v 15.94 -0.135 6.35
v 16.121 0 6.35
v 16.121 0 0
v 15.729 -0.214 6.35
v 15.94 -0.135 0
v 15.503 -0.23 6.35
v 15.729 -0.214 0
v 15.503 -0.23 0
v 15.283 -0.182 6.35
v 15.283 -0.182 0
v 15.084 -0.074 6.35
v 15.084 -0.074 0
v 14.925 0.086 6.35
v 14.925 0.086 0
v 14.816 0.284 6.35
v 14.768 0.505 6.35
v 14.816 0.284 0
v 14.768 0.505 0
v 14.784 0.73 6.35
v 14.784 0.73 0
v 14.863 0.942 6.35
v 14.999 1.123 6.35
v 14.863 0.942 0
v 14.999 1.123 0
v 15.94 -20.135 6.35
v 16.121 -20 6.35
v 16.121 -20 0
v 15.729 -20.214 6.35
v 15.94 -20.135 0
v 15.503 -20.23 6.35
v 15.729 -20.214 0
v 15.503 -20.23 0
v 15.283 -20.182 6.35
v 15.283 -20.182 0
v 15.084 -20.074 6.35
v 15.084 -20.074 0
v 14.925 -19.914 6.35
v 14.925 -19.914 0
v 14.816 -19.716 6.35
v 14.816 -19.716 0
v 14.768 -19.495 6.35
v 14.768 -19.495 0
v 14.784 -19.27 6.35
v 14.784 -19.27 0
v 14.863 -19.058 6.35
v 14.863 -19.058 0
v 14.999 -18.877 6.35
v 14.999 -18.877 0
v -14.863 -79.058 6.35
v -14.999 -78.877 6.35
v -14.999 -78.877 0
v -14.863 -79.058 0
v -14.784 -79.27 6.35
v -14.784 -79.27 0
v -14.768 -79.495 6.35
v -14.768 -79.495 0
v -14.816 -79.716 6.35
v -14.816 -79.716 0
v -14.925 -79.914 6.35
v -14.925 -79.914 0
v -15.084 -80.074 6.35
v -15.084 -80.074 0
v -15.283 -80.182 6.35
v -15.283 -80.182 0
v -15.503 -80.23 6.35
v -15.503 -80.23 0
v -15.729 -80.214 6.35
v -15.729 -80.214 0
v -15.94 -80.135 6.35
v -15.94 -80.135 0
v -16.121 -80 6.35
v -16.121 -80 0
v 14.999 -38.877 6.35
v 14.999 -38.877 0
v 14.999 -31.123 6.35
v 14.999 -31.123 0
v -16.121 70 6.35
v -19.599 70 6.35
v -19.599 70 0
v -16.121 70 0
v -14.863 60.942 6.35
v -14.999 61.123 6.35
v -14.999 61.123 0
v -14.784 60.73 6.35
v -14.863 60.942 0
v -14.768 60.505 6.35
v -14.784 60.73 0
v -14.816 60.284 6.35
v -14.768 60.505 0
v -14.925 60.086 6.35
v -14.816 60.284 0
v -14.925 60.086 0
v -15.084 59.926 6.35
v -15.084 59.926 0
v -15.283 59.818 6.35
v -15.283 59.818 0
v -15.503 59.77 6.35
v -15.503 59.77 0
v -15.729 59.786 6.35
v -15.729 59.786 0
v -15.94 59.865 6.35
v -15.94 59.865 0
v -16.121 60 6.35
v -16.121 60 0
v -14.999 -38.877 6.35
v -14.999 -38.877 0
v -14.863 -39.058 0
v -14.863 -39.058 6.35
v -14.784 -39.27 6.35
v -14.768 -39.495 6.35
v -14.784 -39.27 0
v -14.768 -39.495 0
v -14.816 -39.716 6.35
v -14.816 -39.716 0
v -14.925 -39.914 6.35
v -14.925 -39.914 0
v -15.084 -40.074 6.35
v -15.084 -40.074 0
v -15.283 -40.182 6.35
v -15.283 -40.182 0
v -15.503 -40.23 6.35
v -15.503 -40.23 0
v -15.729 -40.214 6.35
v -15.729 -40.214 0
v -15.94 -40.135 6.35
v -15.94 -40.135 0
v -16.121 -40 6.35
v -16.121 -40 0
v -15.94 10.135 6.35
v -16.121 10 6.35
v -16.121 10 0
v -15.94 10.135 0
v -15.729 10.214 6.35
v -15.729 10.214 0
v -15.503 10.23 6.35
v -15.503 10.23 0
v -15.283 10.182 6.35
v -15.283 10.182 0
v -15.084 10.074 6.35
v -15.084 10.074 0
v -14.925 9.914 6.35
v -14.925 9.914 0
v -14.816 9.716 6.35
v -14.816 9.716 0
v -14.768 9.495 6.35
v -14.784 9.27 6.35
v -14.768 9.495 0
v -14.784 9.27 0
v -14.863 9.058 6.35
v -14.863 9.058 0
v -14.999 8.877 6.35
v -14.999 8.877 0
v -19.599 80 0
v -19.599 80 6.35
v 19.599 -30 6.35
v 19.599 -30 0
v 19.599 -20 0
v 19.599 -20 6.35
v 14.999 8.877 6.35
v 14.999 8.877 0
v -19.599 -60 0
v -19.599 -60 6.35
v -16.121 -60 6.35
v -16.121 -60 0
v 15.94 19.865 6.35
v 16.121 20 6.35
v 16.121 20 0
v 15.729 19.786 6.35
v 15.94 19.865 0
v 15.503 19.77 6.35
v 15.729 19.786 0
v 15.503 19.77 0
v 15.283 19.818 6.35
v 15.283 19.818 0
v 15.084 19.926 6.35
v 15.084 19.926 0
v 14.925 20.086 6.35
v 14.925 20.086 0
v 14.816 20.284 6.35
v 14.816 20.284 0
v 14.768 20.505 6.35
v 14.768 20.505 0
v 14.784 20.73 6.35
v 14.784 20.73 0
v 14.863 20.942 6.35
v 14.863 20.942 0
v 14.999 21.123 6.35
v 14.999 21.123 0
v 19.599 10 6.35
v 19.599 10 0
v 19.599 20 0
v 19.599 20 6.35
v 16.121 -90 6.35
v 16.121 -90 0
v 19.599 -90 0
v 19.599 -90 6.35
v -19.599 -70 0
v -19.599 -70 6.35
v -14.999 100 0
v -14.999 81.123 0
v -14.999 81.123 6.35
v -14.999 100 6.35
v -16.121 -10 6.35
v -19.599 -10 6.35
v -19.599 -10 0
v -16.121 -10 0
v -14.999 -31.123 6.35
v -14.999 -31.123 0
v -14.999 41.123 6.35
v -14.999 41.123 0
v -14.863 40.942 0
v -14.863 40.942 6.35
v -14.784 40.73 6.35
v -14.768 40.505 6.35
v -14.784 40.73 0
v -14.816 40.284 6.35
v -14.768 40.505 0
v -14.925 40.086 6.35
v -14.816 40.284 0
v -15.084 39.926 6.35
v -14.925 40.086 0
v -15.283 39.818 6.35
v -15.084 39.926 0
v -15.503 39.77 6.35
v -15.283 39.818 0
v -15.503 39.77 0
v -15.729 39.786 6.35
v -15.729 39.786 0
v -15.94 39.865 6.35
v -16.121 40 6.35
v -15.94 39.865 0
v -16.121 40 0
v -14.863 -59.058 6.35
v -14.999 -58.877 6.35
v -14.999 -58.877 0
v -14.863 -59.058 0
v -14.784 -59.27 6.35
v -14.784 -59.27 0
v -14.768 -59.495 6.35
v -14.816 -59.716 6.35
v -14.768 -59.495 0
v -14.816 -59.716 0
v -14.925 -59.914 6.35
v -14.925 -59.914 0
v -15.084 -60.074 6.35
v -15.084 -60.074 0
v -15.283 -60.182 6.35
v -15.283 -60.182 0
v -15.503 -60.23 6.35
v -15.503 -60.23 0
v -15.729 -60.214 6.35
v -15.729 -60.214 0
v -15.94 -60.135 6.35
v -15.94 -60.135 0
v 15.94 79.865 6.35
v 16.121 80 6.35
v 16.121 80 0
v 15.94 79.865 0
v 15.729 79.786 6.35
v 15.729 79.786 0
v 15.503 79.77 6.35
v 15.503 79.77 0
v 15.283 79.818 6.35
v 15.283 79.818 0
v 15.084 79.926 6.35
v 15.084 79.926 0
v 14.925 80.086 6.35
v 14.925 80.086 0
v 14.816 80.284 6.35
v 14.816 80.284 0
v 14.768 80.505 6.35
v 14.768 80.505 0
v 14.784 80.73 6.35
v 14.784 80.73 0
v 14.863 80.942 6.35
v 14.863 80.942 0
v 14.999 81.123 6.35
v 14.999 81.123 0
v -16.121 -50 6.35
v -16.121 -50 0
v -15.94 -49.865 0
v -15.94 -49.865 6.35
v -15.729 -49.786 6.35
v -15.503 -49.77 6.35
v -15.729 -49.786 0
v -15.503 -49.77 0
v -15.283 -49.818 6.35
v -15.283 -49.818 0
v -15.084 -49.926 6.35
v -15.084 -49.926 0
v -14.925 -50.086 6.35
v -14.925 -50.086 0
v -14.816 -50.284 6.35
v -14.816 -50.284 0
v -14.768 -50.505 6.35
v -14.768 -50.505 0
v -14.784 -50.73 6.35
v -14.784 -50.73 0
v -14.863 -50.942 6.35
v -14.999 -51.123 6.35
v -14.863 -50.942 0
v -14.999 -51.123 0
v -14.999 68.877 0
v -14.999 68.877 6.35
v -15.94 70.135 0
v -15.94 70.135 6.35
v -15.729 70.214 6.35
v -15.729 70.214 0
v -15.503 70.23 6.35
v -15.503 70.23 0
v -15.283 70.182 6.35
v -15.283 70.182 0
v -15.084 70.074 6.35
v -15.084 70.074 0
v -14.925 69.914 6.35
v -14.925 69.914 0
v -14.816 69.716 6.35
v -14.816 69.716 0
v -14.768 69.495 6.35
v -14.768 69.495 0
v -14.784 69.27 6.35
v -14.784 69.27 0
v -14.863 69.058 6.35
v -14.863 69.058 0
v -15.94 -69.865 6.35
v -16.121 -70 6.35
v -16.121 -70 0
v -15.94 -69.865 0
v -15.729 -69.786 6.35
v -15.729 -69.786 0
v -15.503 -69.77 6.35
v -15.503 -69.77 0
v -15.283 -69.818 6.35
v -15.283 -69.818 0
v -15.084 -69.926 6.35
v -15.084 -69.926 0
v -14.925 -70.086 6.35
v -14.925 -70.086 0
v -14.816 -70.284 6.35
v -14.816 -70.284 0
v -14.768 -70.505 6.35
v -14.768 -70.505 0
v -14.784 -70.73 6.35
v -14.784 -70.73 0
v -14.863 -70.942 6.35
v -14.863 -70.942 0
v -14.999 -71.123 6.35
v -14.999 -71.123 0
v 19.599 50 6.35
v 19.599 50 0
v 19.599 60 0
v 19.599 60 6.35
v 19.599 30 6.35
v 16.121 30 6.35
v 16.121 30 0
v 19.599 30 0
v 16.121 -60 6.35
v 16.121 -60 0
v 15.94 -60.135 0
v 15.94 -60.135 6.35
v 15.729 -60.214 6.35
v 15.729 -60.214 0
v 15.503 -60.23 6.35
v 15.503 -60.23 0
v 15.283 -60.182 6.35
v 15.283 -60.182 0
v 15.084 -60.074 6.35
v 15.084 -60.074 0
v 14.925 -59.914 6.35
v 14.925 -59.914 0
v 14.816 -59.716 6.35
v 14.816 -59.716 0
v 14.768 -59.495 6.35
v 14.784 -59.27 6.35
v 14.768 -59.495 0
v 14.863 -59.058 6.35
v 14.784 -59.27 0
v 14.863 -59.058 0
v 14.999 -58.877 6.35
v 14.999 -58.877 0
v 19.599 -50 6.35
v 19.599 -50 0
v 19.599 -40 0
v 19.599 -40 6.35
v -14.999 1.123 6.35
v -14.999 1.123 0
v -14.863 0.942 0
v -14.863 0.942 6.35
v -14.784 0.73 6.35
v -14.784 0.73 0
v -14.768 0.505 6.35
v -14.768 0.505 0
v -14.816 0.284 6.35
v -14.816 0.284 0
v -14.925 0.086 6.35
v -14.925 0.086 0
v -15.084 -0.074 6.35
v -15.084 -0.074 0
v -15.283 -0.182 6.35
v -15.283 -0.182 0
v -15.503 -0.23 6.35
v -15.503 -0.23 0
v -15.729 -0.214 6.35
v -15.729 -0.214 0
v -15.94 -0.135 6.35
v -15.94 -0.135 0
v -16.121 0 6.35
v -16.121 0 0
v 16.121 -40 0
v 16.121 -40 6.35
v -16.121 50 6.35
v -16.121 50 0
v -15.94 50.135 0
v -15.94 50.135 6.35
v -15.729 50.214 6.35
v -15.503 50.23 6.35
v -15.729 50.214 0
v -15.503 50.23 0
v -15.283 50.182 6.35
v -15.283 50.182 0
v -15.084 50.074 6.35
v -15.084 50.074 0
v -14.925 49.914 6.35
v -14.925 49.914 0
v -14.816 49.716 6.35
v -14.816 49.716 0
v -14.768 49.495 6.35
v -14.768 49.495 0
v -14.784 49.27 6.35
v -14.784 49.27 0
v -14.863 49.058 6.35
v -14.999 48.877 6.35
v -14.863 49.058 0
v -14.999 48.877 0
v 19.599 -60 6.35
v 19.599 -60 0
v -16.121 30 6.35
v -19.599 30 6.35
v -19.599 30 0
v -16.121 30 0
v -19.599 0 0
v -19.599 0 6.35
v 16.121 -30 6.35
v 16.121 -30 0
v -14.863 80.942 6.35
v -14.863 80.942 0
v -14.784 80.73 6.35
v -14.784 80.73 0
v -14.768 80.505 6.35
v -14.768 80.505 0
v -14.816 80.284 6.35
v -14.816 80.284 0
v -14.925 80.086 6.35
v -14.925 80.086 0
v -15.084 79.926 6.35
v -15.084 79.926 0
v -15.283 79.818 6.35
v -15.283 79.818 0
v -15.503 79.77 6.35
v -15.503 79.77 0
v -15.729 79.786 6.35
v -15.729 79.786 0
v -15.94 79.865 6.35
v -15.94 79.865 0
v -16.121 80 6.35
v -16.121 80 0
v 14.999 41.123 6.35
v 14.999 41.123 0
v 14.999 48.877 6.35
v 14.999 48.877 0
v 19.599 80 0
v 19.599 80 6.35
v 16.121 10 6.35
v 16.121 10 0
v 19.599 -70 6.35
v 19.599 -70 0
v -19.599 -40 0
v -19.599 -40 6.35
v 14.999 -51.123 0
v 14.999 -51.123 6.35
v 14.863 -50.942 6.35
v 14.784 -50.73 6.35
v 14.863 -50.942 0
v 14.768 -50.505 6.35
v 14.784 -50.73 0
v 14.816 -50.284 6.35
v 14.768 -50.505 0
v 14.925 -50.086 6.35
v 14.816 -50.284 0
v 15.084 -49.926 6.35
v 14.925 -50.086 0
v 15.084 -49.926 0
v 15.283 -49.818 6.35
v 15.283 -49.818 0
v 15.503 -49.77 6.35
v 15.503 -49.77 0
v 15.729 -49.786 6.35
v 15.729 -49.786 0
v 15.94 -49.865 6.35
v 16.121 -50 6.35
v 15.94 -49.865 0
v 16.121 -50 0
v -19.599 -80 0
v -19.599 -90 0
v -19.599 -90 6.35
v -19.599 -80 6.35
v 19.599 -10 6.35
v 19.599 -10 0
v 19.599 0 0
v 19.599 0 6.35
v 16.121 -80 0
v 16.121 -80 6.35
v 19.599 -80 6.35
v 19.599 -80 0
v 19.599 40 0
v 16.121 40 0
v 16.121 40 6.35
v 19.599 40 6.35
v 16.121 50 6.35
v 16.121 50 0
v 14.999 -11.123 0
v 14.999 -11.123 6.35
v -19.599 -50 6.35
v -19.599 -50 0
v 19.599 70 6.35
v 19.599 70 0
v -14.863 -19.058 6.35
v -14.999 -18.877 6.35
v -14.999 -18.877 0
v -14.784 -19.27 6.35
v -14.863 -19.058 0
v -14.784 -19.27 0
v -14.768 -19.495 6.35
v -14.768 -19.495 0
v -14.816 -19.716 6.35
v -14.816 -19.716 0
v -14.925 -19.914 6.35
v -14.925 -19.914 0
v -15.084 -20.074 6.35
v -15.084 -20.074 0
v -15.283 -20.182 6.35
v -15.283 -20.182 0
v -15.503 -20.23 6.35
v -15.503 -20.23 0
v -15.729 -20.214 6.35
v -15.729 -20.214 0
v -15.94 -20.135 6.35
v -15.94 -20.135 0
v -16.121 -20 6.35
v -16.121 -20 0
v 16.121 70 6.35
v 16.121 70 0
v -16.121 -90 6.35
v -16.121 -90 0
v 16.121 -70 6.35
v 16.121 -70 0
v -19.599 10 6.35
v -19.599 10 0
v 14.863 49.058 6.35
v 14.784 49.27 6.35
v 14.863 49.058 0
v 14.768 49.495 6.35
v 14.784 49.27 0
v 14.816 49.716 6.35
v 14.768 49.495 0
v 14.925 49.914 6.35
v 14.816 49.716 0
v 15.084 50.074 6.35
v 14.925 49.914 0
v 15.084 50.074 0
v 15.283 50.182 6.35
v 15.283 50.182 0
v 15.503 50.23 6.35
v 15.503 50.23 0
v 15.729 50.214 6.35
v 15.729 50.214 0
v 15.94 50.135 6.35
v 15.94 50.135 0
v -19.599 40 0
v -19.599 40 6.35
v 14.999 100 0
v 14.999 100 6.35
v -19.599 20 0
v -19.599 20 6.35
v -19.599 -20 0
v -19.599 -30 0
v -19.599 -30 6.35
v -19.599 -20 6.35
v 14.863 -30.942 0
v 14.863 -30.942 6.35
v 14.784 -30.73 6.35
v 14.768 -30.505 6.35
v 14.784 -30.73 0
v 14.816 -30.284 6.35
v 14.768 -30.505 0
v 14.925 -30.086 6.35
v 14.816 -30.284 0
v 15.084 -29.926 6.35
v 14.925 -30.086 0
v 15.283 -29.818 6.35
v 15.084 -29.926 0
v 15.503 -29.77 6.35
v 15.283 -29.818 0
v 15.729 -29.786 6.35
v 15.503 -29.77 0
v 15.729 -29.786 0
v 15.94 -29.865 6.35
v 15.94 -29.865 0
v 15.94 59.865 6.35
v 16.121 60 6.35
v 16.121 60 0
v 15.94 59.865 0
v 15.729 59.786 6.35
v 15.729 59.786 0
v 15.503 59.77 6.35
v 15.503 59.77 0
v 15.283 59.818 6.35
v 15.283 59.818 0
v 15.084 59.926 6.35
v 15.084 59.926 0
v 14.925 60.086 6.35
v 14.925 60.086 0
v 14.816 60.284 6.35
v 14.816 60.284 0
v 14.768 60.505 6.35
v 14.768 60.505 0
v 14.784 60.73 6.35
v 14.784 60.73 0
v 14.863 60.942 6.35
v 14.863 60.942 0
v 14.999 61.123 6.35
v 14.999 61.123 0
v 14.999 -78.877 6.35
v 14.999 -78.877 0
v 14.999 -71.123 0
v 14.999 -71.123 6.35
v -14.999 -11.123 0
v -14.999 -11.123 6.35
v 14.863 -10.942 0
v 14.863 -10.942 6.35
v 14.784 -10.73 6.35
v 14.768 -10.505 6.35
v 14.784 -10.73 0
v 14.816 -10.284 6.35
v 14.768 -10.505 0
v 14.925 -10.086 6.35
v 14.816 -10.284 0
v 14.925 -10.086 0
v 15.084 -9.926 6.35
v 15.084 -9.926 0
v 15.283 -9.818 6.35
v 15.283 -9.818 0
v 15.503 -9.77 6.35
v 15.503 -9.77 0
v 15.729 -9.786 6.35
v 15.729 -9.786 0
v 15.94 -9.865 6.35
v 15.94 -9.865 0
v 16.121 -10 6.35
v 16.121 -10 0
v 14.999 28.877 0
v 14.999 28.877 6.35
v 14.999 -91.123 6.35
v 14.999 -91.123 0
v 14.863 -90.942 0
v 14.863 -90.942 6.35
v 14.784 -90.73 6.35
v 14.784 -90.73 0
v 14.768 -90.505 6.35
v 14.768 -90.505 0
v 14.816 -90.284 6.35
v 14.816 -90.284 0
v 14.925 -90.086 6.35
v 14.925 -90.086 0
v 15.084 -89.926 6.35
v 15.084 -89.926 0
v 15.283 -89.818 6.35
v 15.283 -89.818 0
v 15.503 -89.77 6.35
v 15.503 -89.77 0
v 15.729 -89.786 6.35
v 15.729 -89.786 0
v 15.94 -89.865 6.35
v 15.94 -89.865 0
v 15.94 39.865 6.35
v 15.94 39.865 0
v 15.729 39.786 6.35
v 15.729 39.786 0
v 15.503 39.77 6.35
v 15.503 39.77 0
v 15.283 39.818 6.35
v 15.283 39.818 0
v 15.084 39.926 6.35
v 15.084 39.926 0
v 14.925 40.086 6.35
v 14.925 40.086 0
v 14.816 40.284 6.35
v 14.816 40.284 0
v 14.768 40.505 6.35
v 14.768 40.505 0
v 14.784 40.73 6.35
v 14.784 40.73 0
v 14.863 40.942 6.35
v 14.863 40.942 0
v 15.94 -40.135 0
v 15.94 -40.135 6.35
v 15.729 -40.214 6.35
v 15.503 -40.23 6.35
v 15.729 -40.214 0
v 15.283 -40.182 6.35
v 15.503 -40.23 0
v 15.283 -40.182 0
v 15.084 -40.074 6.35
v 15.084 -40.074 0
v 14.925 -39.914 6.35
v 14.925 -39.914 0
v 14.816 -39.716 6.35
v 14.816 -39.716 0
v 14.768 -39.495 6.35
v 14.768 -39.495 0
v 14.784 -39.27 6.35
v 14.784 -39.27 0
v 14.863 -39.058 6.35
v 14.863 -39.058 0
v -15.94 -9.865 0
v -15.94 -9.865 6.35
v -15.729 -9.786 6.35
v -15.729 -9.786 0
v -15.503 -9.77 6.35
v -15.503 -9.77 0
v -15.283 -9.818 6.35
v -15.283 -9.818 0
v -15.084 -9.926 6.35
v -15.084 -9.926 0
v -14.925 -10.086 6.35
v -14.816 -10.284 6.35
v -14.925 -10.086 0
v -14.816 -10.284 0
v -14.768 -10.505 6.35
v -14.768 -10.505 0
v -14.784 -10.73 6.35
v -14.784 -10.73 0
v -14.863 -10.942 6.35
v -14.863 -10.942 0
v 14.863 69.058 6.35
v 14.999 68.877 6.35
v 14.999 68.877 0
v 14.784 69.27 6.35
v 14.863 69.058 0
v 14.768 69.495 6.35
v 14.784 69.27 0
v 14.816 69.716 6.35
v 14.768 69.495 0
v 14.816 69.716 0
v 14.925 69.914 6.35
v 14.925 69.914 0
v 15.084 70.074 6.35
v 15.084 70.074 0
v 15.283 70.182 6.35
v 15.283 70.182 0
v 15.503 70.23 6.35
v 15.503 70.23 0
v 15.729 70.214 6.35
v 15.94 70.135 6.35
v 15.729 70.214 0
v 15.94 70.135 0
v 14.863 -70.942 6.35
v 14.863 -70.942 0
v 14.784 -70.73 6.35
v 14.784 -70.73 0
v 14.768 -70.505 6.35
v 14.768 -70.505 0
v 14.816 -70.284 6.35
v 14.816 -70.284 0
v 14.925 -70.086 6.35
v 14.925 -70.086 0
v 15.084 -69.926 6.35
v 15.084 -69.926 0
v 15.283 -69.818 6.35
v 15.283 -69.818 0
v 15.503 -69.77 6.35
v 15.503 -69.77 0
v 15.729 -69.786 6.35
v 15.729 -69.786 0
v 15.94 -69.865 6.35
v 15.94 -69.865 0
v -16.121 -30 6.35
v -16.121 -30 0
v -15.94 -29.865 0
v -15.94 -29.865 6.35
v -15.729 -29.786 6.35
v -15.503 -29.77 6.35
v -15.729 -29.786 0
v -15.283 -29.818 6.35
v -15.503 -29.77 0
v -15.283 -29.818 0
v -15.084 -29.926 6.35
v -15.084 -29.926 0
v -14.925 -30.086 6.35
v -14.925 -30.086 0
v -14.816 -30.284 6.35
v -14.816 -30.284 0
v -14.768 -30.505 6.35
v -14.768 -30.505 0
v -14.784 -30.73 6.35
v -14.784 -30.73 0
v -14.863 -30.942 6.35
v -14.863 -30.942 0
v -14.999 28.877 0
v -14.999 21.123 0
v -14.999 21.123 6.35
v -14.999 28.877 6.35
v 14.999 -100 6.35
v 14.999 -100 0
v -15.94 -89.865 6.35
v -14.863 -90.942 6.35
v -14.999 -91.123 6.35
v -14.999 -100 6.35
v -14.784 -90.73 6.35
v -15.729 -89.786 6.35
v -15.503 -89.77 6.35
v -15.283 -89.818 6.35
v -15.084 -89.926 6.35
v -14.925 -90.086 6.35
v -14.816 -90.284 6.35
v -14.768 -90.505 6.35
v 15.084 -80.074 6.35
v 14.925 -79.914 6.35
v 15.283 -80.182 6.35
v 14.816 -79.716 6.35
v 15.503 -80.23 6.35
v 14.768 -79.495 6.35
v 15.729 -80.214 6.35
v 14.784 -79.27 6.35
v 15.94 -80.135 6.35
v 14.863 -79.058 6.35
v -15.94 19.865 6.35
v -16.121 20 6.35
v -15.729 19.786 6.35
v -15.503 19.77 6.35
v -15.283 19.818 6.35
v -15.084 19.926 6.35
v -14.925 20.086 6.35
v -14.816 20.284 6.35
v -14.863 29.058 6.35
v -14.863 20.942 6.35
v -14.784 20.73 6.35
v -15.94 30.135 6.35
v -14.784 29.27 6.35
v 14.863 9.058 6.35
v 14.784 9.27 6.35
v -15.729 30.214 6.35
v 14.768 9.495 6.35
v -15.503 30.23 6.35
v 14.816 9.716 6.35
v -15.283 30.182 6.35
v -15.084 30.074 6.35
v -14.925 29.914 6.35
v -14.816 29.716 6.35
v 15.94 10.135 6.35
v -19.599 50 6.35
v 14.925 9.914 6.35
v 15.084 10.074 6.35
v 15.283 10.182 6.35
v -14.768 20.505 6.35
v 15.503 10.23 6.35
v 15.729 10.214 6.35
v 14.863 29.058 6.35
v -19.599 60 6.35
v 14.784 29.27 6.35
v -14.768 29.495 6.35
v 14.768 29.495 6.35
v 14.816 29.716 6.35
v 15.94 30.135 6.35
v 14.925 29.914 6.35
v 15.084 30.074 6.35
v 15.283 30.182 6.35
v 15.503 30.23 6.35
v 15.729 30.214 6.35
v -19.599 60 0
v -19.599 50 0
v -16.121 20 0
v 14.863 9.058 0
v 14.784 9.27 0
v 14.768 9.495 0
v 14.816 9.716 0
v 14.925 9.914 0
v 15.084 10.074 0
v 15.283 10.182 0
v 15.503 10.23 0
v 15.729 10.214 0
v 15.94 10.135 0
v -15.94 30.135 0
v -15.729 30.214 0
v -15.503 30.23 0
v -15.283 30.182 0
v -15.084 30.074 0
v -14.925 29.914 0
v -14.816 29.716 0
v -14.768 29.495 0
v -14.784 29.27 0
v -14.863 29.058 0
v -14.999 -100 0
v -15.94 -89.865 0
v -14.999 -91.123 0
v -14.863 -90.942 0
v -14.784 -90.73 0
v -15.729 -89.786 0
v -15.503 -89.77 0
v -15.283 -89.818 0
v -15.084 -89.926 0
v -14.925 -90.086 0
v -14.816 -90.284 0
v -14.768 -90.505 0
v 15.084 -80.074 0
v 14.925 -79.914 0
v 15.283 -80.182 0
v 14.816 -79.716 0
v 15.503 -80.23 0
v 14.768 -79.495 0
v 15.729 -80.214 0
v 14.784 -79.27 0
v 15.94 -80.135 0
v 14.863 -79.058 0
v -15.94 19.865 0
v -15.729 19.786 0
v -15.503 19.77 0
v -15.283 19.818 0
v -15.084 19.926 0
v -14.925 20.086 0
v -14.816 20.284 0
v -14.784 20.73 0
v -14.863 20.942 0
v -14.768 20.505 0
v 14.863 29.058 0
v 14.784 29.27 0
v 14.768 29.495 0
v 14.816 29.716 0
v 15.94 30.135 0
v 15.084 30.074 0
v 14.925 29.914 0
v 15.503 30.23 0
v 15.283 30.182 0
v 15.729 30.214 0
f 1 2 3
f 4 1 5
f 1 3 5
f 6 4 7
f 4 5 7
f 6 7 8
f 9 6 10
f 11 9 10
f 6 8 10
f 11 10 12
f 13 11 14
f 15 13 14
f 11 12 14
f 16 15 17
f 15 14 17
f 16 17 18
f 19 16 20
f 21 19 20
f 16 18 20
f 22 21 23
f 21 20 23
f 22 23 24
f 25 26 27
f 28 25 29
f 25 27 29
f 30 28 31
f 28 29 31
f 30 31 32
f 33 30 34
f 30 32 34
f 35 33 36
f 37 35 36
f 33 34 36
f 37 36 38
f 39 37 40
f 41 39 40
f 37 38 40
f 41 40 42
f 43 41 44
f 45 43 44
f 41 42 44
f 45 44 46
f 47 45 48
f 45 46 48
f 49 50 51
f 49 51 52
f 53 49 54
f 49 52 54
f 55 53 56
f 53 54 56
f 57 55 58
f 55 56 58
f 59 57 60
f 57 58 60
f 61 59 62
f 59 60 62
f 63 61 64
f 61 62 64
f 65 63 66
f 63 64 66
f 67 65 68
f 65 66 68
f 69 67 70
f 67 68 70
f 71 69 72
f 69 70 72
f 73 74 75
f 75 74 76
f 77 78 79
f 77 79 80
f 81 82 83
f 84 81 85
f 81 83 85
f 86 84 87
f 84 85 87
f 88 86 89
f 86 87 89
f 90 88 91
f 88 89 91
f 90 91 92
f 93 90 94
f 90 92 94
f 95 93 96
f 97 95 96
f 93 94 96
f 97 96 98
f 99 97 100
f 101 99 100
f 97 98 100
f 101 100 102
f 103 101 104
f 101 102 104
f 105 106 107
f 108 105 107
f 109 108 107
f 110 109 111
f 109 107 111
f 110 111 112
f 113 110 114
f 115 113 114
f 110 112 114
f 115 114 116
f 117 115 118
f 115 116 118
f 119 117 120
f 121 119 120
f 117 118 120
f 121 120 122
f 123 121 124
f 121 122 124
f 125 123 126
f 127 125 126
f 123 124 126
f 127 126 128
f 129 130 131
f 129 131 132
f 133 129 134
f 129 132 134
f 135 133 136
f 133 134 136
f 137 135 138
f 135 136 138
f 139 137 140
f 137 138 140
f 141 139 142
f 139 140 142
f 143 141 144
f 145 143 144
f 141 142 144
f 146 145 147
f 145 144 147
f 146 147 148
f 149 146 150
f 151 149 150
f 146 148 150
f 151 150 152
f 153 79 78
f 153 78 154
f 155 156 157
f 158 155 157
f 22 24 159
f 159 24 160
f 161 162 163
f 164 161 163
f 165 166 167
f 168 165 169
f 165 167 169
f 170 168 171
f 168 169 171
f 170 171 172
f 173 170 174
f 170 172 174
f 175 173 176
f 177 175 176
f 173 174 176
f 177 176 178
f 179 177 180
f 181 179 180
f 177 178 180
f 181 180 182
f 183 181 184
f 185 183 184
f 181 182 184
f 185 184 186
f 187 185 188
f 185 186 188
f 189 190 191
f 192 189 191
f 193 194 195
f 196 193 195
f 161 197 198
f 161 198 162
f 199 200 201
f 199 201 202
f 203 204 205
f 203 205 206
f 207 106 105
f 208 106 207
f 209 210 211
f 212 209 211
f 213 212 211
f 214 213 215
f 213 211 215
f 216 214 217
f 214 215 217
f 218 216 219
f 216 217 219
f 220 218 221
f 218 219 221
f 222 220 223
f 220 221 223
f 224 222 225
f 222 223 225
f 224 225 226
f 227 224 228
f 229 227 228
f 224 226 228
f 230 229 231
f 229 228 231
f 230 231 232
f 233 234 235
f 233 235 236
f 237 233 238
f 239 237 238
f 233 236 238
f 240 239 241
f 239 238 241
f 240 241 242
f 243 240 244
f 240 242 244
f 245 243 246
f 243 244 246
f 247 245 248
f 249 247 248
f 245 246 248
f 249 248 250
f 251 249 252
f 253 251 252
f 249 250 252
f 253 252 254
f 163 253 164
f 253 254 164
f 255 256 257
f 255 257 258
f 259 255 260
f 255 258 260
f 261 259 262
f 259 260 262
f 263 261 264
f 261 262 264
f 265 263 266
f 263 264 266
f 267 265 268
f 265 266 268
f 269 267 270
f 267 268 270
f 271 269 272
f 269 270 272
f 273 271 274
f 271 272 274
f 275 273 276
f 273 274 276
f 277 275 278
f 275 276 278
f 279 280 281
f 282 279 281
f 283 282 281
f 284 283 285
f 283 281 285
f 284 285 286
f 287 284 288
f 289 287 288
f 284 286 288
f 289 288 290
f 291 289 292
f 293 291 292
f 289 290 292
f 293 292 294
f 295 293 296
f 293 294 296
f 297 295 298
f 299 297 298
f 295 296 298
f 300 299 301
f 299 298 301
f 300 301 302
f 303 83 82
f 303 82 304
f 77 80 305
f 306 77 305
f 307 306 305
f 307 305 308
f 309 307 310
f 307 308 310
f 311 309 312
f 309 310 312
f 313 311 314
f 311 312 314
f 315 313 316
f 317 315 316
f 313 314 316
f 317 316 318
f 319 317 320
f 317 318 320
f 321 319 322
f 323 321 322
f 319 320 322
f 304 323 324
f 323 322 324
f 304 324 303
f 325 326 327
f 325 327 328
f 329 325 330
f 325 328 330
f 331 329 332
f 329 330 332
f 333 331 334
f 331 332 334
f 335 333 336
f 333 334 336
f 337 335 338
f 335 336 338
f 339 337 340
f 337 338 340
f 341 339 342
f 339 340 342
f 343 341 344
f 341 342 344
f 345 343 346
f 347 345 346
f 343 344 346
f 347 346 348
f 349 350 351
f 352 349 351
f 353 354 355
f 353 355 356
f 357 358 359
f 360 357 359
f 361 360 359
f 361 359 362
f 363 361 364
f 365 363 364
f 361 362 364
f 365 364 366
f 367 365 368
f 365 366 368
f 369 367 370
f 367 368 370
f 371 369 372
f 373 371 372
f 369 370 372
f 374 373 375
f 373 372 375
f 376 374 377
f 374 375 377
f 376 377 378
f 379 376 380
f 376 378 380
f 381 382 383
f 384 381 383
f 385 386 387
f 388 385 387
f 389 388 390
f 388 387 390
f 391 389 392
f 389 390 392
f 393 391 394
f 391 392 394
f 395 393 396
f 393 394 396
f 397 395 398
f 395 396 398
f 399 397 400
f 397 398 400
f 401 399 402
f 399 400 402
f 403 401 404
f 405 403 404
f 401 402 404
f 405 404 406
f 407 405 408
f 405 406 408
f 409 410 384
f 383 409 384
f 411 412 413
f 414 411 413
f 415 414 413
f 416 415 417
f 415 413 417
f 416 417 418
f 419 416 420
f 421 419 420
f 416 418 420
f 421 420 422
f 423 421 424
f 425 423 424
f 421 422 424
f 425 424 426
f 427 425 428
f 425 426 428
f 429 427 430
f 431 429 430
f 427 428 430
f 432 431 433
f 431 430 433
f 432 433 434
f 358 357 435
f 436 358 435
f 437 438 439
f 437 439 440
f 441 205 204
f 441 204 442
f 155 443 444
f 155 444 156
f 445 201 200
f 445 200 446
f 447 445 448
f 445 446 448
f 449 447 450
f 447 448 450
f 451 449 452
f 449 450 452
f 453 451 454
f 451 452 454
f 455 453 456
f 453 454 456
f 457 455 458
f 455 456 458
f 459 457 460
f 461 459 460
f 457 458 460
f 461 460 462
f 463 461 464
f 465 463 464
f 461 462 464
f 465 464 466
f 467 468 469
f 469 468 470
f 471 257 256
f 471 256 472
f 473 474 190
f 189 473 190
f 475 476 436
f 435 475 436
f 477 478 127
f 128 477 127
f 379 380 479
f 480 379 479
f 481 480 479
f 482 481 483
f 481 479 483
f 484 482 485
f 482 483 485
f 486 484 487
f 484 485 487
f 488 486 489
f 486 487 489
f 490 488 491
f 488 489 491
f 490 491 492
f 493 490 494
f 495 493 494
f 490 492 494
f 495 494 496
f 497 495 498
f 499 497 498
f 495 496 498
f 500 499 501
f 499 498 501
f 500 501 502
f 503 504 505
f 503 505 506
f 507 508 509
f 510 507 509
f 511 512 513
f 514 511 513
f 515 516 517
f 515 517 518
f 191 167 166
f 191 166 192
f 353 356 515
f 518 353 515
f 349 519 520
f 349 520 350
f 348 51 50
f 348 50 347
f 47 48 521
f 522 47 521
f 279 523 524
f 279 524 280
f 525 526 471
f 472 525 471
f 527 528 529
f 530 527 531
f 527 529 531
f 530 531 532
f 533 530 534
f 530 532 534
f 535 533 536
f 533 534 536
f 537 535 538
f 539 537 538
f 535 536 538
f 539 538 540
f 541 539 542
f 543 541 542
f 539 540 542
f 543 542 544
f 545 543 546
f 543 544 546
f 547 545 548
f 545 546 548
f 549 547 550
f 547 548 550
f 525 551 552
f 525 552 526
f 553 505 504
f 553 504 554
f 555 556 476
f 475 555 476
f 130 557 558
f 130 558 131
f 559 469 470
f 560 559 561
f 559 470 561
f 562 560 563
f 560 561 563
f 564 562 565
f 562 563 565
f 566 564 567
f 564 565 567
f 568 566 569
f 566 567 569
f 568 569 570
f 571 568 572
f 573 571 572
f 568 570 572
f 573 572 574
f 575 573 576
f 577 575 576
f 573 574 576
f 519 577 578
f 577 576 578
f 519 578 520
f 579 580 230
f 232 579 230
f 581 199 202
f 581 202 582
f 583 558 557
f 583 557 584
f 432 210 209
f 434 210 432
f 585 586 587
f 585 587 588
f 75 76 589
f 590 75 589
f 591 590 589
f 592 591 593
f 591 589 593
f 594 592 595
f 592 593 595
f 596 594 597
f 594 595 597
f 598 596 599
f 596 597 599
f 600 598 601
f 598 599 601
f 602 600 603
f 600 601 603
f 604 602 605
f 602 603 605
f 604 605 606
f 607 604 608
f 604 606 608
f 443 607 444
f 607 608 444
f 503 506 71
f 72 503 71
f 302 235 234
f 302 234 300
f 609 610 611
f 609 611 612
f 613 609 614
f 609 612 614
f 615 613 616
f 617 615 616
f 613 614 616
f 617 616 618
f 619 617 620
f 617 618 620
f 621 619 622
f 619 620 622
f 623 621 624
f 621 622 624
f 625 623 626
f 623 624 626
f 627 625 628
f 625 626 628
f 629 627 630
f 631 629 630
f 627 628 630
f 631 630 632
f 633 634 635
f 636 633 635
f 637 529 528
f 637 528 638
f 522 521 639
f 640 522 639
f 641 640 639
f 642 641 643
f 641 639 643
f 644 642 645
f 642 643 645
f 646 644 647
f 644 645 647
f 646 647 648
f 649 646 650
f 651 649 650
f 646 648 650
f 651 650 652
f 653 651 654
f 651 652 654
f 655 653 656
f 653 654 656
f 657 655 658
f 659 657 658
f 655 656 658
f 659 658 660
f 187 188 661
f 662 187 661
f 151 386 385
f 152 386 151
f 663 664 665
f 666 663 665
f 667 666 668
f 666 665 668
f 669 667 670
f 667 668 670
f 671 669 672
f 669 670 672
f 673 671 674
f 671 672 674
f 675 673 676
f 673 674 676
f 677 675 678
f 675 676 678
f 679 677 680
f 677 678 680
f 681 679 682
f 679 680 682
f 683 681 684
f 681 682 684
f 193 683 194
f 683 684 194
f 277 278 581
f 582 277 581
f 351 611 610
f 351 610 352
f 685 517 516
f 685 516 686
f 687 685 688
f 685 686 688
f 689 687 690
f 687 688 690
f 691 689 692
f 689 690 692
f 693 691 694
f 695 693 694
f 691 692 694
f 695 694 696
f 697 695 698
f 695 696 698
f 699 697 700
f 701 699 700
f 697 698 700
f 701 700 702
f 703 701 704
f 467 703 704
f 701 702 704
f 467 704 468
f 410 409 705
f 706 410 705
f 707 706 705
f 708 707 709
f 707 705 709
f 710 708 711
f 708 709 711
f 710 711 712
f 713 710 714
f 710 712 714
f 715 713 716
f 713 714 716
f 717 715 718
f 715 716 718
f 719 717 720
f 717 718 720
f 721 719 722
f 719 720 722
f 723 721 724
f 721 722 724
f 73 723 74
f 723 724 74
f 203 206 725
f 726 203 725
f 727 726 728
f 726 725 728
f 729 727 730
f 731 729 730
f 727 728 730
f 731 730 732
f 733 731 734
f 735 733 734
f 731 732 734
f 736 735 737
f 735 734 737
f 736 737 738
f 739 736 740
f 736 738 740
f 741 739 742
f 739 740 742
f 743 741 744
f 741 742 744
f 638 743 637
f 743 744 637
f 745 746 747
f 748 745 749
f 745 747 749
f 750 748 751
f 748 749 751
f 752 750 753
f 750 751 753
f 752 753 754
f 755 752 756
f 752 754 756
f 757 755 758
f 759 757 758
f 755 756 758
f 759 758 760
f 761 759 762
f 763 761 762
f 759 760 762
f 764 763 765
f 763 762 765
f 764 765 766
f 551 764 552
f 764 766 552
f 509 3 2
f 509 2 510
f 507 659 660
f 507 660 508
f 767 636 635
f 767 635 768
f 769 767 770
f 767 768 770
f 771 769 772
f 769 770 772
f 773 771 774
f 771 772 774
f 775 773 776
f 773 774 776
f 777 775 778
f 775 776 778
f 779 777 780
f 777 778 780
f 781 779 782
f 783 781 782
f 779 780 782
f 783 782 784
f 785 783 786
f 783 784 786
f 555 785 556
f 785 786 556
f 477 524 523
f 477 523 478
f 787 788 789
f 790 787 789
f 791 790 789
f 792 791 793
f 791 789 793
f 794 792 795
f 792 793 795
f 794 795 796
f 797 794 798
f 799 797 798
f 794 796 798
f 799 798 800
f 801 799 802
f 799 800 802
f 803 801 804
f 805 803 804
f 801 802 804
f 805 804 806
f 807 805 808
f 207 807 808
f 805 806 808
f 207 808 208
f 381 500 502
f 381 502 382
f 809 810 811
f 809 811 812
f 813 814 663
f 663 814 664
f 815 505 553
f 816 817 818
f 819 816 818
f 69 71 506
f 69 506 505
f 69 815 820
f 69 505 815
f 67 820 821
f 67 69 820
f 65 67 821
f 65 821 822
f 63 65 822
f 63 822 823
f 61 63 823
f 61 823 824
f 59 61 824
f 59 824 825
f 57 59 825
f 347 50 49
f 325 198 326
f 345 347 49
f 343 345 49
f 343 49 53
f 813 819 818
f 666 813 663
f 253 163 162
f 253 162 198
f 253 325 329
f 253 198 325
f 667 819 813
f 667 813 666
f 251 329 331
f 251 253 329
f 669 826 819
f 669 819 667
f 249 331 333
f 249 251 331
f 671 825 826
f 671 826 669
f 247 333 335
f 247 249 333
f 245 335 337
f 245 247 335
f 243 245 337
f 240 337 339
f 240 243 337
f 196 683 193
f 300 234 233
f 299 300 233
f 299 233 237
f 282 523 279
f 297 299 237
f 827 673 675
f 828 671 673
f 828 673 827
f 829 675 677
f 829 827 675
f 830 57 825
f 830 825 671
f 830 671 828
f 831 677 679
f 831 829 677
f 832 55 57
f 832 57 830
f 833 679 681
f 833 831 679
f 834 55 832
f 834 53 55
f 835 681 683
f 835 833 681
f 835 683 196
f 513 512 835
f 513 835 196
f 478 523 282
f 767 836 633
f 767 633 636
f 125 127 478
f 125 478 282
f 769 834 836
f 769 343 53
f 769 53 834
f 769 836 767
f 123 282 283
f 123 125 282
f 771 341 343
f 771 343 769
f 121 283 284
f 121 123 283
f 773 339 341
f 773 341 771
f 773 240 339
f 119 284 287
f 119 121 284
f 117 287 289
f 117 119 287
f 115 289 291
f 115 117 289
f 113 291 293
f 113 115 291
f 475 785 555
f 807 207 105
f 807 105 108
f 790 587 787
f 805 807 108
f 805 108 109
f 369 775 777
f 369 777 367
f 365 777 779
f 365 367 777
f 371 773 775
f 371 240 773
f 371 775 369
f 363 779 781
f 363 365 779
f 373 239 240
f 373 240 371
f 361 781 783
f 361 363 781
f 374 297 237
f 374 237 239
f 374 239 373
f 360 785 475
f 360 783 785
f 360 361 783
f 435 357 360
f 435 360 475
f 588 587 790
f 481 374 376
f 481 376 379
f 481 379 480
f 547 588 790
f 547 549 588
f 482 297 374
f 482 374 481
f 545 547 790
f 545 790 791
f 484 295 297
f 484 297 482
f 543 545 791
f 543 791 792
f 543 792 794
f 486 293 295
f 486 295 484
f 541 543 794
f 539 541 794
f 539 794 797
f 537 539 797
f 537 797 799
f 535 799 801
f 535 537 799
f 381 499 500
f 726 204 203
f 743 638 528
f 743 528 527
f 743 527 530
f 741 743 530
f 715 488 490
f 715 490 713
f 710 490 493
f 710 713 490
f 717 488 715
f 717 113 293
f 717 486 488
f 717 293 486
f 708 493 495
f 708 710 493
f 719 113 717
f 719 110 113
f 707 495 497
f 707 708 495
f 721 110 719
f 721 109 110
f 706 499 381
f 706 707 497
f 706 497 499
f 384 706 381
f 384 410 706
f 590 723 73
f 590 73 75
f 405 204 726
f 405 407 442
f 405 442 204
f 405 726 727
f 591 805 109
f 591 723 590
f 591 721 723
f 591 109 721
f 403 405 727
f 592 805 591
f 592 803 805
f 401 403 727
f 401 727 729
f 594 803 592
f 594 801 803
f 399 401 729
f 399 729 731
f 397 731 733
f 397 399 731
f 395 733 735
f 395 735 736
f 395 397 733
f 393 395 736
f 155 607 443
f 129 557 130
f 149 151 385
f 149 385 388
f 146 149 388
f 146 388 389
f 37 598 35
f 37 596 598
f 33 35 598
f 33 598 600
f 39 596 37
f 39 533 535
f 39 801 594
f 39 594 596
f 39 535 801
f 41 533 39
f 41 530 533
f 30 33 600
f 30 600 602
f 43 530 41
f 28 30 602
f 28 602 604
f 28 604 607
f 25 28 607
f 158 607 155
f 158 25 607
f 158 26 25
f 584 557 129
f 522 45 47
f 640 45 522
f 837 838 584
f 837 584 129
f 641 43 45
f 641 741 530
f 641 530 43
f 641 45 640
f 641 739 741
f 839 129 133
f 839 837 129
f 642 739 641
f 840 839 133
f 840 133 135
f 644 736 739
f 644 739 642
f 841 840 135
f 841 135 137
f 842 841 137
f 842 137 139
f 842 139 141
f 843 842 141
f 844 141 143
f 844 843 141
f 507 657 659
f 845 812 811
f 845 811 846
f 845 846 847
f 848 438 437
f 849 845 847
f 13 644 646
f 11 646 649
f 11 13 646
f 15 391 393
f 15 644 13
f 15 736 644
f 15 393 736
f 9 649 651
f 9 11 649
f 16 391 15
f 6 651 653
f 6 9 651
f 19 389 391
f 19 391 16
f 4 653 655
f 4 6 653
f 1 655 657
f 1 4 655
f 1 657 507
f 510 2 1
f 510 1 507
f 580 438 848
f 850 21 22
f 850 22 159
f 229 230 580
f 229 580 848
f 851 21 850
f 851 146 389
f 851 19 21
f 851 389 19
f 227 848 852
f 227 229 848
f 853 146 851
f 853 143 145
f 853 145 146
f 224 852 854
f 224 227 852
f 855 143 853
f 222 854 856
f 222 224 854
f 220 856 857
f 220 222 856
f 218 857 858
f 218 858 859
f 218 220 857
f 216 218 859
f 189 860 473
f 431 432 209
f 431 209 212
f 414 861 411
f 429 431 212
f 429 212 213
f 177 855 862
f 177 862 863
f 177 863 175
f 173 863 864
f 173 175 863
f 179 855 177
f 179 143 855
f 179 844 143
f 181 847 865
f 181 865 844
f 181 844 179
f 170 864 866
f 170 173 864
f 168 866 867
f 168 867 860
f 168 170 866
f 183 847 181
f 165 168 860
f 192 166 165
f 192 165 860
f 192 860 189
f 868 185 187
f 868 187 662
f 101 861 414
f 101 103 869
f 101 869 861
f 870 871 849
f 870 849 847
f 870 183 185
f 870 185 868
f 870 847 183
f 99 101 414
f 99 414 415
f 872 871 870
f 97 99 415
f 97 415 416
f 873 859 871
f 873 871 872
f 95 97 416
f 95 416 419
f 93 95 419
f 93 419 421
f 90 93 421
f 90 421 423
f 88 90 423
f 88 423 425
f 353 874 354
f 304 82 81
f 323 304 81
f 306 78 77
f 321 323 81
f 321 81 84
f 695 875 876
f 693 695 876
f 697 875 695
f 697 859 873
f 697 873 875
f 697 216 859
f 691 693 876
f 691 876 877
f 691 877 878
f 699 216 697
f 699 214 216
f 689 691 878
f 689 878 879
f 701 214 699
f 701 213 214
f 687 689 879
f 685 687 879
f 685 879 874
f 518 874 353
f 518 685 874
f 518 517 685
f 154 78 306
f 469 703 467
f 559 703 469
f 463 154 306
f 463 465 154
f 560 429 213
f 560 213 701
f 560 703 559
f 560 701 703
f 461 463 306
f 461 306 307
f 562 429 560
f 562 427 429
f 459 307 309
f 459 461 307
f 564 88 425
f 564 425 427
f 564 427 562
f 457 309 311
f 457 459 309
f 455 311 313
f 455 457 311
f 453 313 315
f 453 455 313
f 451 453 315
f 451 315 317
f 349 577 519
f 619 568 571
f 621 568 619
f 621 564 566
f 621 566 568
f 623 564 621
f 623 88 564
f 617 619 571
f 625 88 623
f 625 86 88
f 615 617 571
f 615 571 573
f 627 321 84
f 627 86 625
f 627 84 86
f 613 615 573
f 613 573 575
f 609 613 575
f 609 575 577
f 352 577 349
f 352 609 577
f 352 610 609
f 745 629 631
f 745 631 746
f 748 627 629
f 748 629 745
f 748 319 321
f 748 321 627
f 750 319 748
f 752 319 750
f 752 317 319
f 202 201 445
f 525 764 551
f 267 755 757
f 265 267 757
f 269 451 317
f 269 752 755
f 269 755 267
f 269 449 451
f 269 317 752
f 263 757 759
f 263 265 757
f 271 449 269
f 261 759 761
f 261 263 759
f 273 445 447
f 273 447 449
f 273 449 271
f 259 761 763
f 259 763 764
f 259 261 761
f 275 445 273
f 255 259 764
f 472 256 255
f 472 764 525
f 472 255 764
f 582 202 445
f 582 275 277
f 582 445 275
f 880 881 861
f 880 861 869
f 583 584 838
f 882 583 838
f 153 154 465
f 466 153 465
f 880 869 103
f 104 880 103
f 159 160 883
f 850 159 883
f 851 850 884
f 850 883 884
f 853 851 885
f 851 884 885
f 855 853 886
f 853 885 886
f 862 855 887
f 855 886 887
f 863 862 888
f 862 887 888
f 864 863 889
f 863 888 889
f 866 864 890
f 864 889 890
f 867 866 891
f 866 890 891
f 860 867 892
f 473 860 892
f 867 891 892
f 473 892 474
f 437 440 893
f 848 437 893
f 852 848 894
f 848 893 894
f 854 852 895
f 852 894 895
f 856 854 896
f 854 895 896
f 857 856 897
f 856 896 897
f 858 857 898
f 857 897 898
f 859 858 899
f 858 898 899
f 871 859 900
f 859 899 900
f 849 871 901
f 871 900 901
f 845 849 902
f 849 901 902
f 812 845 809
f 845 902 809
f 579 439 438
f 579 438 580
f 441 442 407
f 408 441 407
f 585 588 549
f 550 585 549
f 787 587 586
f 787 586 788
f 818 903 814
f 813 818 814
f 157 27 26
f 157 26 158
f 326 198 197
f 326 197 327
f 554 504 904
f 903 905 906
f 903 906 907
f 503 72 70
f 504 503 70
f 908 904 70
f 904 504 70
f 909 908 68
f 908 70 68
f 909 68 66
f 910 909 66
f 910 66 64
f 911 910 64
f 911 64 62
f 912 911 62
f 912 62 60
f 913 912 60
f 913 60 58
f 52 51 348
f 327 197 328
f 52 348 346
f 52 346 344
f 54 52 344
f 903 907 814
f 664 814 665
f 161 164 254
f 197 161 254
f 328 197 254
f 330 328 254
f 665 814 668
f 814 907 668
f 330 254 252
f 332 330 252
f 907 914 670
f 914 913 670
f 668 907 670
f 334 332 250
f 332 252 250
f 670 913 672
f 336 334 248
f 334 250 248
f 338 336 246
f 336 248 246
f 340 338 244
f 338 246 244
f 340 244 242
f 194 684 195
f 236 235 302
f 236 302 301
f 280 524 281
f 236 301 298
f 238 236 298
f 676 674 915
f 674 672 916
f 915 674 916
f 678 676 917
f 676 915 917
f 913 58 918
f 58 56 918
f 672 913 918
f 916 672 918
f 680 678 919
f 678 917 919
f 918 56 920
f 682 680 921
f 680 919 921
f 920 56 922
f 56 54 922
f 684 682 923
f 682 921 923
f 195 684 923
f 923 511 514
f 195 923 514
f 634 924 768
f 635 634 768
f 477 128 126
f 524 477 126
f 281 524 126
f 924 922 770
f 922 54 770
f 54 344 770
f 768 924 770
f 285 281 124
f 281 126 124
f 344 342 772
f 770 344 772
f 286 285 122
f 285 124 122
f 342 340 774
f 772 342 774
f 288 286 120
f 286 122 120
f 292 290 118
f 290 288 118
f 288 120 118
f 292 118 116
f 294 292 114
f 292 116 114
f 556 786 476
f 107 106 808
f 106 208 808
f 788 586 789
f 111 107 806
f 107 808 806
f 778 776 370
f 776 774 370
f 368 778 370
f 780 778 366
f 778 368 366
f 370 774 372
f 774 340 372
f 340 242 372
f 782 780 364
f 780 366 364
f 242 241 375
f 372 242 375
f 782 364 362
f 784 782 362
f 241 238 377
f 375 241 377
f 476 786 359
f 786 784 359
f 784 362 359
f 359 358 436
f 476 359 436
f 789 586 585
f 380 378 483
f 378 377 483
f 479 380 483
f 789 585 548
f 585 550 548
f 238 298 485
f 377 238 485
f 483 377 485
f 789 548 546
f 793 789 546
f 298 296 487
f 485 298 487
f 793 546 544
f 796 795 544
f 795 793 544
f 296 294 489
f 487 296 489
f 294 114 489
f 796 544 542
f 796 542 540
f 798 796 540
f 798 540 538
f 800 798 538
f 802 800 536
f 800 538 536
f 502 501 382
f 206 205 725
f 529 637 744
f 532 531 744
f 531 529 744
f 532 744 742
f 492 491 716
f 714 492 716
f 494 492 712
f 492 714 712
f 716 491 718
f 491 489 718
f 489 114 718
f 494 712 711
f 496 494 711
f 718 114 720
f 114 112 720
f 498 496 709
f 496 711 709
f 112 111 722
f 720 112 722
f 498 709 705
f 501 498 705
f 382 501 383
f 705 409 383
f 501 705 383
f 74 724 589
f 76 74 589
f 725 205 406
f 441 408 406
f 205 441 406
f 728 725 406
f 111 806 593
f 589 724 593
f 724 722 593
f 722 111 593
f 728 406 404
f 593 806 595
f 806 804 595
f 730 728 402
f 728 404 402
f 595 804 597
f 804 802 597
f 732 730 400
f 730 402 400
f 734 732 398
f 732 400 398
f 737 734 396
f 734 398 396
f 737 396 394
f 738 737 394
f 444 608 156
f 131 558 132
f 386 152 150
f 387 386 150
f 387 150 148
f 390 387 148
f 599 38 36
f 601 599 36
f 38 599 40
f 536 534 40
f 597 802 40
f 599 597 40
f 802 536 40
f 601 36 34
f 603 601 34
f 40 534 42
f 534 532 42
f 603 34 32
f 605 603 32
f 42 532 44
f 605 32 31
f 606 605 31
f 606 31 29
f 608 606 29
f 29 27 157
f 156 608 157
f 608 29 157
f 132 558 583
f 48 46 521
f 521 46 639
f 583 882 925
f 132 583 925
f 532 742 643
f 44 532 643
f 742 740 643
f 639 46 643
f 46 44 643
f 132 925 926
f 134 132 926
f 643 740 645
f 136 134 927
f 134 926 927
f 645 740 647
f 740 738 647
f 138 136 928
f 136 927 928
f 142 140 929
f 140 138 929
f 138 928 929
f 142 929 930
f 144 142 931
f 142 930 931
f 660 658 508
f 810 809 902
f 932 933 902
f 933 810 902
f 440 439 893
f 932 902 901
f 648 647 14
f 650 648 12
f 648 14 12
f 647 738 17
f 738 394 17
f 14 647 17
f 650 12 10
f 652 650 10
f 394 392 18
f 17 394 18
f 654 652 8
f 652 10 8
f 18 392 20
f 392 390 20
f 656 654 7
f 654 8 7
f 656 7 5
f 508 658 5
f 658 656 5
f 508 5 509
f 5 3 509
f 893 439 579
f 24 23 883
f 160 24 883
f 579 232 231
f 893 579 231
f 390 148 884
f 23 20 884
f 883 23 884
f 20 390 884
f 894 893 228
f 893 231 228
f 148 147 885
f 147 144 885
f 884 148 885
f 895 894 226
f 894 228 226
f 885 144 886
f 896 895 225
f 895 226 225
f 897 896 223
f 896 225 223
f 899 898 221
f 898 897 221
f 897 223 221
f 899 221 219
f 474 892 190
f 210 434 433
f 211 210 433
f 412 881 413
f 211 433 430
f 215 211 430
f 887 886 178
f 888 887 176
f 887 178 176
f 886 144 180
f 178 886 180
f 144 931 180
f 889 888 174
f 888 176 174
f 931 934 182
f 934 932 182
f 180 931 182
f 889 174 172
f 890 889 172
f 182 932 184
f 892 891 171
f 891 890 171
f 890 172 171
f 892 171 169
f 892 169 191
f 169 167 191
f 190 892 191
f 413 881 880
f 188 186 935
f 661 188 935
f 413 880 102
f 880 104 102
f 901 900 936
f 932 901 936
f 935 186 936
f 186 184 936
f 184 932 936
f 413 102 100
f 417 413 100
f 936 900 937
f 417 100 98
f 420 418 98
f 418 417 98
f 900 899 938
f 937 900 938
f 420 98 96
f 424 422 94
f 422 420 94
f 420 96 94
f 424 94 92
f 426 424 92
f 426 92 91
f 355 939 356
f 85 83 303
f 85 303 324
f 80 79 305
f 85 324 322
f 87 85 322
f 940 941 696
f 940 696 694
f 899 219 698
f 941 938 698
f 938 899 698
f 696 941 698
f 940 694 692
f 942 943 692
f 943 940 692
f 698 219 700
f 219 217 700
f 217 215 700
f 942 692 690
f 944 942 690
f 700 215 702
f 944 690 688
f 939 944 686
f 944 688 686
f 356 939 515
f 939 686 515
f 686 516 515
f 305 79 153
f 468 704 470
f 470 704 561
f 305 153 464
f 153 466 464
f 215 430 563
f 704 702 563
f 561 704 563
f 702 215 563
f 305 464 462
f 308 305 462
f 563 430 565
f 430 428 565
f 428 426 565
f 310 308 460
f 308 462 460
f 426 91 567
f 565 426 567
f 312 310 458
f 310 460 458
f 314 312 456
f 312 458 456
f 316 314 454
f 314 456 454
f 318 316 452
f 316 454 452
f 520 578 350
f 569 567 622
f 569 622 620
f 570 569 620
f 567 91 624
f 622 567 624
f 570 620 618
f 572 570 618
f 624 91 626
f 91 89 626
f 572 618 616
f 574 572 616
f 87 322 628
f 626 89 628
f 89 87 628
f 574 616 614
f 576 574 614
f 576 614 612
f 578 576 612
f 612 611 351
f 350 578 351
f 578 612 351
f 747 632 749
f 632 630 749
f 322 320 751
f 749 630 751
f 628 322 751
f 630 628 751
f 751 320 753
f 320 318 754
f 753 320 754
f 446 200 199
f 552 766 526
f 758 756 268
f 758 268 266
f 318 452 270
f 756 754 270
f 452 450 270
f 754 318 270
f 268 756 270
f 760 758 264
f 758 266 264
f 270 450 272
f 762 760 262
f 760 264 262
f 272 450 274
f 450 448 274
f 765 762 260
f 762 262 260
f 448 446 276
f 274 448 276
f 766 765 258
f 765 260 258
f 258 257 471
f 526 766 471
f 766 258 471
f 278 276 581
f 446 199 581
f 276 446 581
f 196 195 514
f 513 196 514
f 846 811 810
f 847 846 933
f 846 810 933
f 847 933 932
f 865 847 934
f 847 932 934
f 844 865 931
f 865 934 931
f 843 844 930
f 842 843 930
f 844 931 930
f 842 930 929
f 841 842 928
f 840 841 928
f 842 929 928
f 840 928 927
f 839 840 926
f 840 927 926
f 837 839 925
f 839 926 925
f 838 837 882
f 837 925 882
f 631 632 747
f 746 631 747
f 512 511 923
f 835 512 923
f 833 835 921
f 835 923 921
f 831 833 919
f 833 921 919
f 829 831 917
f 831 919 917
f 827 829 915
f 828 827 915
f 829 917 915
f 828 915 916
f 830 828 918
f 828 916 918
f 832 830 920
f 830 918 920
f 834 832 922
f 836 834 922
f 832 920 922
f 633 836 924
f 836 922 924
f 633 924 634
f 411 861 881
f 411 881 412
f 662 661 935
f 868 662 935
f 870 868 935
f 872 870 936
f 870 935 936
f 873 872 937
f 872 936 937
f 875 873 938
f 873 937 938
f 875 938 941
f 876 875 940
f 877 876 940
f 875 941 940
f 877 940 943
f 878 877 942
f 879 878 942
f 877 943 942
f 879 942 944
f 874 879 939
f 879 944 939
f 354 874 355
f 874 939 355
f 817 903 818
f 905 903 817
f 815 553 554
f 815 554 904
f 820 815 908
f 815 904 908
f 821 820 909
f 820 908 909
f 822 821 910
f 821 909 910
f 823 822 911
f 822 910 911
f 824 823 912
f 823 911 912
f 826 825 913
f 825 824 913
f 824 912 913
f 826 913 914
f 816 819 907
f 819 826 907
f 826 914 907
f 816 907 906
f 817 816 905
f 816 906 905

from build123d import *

# Parameters (mm, degrees)
SKETCH1_W           = 29.9974
SKETCH1_H           = 200
BOSS_EXTRUDE1_DEPTH = 6.35
SKETCH2_W           = 4.6
SKETCH2_H           = 10
BOSS_EXTRUDE2_DEPTH = 6.35
LPATTERN1_COUNT     = 9
LPATTERN1_PITCH     = 20
DOGBONE01_D         = 1.5875
DOGBONE02_D         = 1.5875
LPATTERN2_COUNT     = 9
LPATTERN2_PITCH     = 20
LPATTERN4_COUNT     = 9
LPATTERN4_PITCH     = 20


with BuildPart() as part:
    # Sketch1 → Boss-Extrude1 (new body)
    with BuildSketch(Plane.XY):
        Rectangle(SKETCH1_W, SKETCH1_H)
    extrude(amount=BOSS_EXTRUDE1_DEPTH)

    # Sketch2 → Boss-Extrude2 (add)
    with BuildSketch(Plane.XY):
        with Locations((-17.2987, -85)):
            Rectangle(SKETCH2_W, SKETCH2_H)
        with Locations((17.2987, -85)):
            Rectangle(SKETCH2_W, SKETCH2_H)
    boss_extrude2 = extrude(amount=BOSS_EXTRUDE2_DEPTH)

    # LPattern1: Boss-Extrude2 ×9
    with Locations(*[(0, i * LPATTERN1_PITCH, 0) for i in range(1, LPATTERN1_COUNT)]):
        add(boss_extrude2)

    # dogBone01 (through all)
    with Locations(Plane.XY.offset(6.35)):
        with Locations((15.559966008, -90.561266008), (-15.559966008, -90.561266008)):
            dogbone01 = Hole(DOGBONE01_D / 2)

    # dogBone02 (through all)
    with Locations(Plane.XY.offset(6.35)):
        with Locations((15.559966008, -79.438733992), (-15.559966008, -79.438733992)):
            dogbone02 = Hole(DOGBONE02_D / 2)

    # LPattern2: dogBone01 ×9
    with Locations(*[(0, i * LPATTERN2_PITCH, 0) for i in range(1, LPATTERN2_COUNT)]):
        add(dogbone01, mode=Mode.SUBTRACT)

    # LPattern4: dogBone02 ×9
    with Locations(*[(0, i * LPATTERN4_PITCH, 0) for i in range(1, LPATTERN4_COUNT)]):
        add(dogbone02, mode=Mode.SUBTRACT)


solid = part.part
